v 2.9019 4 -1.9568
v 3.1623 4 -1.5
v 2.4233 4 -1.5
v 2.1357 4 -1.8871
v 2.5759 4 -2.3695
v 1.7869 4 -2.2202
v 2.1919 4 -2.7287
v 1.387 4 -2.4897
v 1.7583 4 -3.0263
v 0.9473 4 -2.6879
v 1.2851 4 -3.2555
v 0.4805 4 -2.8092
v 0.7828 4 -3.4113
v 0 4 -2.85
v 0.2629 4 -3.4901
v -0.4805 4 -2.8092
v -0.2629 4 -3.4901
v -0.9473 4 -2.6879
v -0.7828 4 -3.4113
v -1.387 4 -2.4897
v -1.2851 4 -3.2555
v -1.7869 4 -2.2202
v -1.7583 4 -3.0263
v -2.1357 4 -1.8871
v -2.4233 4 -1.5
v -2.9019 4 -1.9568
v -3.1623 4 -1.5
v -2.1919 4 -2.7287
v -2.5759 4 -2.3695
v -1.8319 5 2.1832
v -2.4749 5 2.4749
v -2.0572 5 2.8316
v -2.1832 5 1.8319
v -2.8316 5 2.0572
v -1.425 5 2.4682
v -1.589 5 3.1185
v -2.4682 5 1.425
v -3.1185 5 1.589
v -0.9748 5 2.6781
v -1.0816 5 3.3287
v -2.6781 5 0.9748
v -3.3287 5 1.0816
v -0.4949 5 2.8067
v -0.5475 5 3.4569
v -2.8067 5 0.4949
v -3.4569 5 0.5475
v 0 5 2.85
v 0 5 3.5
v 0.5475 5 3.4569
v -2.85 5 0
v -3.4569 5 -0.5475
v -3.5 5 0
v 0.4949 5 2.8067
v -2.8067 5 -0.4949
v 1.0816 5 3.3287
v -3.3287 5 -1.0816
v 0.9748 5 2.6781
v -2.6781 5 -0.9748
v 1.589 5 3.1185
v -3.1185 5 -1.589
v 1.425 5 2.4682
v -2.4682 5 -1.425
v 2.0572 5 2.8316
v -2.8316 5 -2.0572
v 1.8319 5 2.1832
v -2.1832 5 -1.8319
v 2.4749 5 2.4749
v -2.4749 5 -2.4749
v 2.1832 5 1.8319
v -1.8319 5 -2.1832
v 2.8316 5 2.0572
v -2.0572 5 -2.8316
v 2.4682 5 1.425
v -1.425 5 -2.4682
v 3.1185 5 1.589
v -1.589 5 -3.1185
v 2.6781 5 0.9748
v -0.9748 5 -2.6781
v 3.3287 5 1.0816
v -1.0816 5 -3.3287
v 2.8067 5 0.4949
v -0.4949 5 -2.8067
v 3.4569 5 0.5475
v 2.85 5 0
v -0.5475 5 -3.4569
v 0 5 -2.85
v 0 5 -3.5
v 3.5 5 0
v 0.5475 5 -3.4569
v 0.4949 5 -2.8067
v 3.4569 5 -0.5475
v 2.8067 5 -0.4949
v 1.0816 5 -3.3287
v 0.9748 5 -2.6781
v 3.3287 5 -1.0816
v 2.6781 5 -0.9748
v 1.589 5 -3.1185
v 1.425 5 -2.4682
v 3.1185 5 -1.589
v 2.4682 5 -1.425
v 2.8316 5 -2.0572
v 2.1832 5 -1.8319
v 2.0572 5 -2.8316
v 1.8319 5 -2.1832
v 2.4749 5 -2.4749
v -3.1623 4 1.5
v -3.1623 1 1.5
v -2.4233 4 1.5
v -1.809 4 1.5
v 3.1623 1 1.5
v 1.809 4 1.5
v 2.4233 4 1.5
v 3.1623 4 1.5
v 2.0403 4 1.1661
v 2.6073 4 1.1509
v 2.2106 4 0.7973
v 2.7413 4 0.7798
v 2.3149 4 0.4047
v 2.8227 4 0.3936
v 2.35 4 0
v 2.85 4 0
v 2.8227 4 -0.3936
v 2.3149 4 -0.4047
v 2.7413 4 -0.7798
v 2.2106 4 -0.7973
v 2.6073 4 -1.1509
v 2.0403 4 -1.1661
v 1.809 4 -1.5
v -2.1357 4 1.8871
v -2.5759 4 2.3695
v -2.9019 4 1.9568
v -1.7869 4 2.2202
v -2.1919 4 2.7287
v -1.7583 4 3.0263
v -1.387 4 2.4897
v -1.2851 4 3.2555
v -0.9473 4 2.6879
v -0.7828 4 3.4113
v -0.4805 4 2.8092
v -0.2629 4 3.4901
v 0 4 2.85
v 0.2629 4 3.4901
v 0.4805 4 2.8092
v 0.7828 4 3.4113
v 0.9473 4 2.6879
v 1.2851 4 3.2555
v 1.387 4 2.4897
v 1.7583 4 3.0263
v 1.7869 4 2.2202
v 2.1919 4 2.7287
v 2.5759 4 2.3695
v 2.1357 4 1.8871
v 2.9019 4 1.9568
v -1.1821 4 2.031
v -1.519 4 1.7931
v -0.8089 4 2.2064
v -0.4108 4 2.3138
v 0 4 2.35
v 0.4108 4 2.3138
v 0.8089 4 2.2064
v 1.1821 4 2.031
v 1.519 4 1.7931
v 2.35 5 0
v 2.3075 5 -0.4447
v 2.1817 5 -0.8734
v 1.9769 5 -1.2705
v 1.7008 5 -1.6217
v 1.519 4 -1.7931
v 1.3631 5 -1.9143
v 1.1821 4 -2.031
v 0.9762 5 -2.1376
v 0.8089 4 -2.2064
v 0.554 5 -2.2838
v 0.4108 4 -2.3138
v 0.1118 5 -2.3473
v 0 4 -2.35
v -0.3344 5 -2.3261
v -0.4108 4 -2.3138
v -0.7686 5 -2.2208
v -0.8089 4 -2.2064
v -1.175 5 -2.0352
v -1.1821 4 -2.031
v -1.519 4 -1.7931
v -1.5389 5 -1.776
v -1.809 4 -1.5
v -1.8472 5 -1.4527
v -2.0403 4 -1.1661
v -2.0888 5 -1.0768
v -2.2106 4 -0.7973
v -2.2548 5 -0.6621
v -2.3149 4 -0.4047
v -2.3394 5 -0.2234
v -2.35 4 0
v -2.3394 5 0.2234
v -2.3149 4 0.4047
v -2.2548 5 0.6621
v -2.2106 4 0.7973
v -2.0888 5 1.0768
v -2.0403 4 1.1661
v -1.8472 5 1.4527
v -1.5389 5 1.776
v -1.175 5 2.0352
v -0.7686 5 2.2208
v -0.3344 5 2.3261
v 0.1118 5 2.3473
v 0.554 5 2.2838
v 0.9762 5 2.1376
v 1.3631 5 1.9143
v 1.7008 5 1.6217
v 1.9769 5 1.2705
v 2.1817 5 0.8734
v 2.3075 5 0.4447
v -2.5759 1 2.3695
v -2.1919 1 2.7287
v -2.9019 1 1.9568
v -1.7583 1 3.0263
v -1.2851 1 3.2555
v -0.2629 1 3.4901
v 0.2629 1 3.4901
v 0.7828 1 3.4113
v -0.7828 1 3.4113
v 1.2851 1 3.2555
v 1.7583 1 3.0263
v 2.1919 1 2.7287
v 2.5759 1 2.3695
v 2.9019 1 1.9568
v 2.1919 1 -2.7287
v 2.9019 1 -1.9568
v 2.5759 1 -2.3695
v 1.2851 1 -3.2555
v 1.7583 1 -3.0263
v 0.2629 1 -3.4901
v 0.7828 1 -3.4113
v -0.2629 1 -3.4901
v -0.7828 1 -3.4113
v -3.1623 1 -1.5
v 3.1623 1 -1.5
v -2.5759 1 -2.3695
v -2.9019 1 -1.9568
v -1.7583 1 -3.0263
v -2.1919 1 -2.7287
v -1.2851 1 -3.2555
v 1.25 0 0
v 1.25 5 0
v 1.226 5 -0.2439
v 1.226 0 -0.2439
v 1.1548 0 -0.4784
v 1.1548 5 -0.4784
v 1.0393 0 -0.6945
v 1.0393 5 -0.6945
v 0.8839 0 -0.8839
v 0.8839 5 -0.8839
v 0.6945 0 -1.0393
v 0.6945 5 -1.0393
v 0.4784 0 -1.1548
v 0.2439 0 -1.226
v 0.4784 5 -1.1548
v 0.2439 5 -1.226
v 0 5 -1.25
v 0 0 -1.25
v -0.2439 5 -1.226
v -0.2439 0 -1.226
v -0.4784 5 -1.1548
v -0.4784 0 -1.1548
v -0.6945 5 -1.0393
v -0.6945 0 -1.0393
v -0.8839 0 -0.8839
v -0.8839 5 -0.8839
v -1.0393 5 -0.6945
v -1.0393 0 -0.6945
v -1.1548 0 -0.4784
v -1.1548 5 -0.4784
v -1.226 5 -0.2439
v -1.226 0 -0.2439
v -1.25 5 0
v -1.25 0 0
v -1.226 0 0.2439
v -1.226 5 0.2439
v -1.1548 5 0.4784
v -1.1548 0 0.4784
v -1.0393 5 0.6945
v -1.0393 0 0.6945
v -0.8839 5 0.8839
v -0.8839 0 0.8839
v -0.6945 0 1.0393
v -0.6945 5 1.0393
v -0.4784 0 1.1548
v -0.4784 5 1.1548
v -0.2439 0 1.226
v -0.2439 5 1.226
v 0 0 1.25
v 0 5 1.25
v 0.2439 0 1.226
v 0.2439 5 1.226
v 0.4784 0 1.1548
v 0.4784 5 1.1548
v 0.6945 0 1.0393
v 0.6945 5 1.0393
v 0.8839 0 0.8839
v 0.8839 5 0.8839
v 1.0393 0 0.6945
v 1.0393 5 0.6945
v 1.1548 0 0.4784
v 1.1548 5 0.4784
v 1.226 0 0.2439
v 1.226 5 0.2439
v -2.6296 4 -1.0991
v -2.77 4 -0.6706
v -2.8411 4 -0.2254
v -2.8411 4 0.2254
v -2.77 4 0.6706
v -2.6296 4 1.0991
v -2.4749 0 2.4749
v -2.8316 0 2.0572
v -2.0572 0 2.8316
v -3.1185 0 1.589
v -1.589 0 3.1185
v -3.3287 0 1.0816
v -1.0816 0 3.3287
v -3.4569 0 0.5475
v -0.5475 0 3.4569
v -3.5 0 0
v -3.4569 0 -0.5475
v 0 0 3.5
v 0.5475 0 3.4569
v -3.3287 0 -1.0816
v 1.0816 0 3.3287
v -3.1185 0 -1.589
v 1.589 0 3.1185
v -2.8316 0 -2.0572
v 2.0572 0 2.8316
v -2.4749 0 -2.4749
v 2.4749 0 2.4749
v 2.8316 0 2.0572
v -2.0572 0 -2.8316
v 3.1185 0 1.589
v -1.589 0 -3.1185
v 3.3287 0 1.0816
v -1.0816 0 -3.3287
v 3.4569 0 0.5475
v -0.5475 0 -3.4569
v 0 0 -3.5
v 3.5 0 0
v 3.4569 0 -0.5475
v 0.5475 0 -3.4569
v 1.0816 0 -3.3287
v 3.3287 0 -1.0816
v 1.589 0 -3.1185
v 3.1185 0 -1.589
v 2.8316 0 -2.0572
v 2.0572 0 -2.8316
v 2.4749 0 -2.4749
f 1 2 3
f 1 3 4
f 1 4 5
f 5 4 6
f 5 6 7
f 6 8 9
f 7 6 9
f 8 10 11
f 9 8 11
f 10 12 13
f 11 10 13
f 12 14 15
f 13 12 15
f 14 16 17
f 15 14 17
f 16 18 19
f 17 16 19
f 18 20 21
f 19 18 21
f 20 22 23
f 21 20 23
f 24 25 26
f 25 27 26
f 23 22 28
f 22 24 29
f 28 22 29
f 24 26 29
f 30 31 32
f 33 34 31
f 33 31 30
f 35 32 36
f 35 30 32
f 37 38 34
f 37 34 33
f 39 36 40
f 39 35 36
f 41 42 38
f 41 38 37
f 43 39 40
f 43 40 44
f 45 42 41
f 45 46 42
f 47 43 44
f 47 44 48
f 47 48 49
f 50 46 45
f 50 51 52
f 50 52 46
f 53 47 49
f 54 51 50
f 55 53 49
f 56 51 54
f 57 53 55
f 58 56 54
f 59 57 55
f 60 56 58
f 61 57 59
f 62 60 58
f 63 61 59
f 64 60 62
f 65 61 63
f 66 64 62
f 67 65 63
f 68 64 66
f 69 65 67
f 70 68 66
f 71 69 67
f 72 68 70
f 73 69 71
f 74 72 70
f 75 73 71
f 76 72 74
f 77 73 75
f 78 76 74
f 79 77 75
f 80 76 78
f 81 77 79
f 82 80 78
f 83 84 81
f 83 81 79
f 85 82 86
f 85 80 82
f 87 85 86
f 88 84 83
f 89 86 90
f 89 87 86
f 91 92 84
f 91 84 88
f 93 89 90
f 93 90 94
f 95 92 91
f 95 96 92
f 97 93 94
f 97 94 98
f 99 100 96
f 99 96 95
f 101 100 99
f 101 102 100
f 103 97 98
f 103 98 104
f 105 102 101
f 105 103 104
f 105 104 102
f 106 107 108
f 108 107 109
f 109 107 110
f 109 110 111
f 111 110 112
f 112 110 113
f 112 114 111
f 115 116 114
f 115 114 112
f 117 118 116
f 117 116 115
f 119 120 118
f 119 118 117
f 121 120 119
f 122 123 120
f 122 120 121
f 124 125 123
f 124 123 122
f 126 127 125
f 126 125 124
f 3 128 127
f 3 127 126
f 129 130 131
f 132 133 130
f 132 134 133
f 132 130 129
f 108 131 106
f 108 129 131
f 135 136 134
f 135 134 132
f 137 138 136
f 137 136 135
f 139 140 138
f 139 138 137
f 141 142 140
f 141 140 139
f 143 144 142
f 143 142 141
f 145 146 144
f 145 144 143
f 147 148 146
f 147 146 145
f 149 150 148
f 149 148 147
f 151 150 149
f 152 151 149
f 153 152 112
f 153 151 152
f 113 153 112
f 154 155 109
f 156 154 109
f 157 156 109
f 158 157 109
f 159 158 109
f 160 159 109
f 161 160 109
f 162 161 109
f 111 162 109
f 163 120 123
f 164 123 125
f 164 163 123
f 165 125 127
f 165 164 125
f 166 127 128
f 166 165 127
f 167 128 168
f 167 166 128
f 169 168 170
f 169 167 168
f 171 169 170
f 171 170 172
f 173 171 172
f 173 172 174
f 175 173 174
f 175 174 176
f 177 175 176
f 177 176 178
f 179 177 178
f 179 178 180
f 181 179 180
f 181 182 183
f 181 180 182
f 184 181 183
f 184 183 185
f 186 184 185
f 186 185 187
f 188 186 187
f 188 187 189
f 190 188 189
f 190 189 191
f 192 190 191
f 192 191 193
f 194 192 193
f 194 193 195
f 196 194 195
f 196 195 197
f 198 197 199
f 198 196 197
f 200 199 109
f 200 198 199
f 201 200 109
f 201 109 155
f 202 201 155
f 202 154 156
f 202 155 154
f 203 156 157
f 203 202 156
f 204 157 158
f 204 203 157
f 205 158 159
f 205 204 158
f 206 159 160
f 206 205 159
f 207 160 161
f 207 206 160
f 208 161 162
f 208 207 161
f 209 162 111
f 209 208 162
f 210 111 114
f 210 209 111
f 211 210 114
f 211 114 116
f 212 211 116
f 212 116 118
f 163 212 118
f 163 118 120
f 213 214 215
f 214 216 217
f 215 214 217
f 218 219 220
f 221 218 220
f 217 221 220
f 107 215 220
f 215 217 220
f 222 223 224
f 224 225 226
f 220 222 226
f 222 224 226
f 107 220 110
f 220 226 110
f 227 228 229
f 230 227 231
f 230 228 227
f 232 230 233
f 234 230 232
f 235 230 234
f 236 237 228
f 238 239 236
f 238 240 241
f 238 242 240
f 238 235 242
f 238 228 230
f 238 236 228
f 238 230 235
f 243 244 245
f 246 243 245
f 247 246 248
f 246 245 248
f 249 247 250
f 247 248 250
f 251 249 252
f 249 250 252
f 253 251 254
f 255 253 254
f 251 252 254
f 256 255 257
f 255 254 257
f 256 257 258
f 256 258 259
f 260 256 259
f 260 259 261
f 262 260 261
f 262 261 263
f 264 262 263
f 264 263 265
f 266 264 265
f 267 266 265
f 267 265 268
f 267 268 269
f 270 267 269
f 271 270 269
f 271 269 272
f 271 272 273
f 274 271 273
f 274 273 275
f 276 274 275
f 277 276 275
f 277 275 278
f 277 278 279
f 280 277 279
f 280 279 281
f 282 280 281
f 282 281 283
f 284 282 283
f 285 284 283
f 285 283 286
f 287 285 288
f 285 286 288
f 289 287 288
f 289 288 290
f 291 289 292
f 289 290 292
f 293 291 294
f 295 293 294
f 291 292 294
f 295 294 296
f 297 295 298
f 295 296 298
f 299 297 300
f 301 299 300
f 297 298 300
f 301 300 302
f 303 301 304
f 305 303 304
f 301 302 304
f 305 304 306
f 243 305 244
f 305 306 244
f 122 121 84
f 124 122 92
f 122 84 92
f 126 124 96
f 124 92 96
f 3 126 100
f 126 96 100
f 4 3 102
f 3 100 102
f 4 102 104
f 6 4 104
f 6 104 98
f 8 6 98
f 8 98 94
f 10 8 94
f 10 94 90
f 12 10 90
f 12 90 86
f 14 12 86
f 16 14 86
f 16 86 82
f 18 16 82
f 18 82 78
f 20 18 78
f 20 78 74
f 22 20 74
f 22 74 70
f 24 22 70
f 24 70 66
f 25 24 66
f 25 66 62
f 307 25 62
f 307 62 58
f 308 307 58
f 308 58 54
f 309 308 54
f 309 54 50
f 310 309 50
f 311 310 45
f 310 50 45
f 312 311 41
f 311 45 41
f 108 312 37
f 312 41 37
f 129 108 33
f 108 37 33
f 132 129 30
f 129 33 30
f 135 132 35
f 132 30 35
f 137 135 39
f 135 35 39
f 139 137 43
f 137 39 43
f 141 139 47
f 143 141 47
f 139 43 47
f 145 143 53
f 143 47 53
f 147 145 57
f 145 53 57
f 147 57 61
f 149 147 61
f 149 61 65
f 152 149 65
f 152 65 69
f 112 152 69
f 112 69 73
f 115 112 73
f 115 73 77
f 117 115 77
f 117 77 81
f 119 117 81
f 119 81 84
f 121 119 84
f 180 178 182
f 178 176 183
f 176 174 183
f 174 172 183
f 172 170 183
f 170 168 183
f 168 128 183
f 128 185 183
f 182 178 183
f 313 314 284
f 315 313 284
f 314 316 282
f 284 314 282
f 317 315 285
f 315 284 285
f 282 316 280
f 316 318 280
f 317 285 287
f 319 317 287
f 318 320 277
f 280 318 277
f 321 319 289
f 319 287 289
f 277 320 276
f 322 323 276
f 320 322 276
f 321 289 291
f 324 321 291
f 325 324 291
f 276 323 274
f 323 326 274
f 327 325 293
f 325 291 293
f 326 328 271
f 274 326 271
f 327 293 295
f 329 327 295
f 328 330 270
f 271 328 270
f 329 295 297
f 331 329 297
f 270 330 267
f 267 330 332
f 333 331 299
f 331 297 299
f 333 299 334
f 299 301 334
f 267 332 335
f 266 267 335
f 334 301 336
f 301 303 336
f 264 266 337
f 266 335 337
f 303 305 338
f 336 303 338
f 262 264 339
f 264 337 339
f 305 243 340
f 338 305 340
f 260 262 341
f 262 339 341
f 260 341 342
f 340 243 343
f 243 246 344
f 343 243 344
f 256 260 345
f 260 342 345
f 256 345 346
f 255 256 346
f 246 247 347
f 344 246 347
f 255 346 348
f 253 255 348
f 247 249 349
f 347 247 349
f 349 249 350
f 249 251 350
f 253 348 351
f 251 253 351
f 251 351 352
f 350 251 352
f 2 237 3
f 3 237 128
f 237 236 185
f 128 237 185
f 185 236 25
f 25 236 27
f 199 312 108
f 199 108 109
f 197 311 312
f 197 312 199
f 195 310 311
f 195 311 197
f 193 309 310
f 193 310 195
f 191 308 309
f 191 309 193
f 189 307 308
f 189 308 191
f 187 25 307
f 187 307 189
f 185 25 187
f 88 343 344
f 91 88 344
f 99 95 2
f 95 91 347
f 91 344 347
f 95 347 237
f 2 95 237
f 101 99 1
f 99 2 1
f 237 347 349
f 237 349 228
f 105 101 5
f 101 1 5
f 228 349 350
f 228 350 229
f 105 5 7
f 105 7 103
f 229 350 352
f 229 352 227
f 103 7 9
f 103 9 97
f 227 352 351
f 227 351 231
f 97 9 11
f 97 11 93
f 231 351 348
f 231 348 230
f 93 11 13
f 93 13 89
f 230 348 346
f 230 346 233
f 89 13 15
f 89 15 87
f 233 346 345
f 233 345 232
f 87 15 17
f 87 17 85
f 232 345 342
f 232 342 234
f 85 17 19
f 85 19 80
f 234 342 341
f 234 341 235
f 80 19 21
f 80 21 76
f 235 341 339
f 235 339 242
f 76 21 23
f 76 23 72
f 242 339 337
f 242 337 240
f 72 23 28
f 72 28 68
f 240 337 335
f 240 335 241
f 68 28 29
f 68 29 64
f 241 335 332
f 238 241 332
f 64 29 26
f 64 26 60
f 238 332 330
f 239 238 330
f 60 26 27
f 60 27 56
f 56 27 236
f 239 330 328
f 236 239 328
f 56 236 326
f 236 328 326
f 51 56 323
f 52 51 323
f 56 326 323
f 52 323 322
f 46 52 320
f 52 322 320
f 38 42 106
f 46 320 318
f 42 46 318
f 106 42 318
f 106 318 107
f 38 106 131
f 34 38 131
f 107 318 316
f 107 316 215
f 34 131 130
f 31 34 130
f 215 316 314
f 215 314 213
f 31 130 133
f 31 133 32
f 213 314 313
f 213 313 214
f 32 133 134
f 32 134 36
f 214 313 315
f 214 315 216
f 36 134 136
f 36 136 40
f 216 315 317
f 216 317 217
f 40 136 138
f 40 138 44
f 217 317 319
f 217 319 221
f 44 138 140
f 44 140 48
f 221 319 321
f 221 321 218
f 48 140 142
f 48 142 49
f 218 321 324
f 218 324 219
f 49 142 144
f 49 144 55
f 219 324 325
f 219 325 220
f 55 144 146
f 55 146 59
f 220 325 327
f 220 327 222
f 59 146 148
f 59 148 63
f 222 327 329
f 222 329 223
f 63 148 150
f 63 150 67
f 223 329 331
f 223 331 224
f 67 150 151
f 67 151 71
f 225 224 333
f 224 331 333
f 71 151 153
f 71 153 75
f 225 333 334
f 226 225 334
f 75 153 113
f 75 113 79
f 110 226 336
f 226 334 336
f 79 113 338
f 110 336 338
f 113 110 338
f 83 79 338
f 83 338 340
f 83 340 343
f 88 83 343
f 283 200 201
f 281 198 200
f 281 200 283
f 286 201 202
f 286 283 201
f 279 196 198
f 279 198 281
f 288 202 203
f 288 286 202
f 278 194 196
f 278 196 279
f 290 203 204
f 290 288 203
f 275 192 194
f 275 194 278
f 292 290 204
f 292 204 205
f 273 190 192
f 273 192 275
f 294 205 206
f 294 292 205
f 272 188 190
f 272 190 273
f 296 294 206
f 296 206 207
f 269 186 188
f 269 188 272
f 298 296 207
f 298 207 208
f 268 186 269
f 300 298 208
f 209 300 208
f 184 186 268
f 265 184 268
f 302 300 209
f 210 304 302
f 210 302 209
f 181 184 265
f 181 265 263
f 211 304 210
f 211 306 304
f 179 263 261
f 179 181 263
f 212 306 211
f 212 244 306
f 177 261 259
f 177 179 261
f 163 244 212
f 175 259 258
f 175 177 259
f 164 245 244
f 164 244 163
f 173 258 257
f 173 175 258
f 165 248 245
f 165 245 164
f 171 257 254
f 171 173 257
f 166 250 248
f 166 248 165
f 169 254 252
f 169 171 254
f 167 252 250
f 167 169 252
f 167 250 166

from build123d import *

# Parameters (mm, degrees)
ESQUISSE1_R                  = 3.5
BOSS_EXTRU_1_DEPTH           = 5
ESQUISSE2_R                  = 2.85
ESQUISSE2_R_2                = 2.35
ENL_V_MAT_EXTRU_1_DEPTH      = 1
ESQUISSE3_R                  = 1.25
ENL_V_MAT_EXTRU_2_DEPTH      = 6
ESQUISSE4_W                  = 2
ESQUISSE4_H                  = 3
ENL_V_MAT_EXTRU_3_DEPTH      = 4.5
ENL_V_MAT_EXTRU_3_DEPTH_BACK = 4.5


with BuildPart() as part:
    # Esquisse1 → Boss.-Extru.1 (new body)
    with BuildSketch(Plane(origin=(0, 0, 0), x_dir=(1, 0, 0), z_dir=(0, 1, 0))):
        Circle(ESQUISSE1_R)
    extrude(amount=BOSS_EXTRU_1_DEPTH)

    # Esquisse2 → Enlèv. mat.-Extru.1 (cut)
    with BuildSketch(Plane(origin=(0, 5, 0), x_dir=(1, 0, 0), z_dir=(0, 1, 0))):
        Circle(ESQUISSE2_R)
        Circle(ESQUISSE2_R_2, mode=Mode.SUBTRACT)
    extrude(amount=-ENL_V_MAT_EXTRU_1_DEPTH, mode=Mode.SUBTRACT)

    # Esquisse3 → Enlèv. mat.-Extru.2 (cut, through all)
    with BuildSketch(Plane(origin=(0, 5, 0), x_dir=(1, 0, 0), z_dir=(0, 1, 0))):
        Circle(ESQUISSE3_R)
    extrude(amount=-ENL_V_MAT_EXTRU_2_DEPTH, mode=Mode.SUBTRACT)

    # Esquisse4 → Enlèv. mat.-Extru.3 (cut, two sides)
    with BuildSketch(Plane(origin=(0, 0, 0), x_dir=(0, 0, -1), z_dir=(1, 0, 0))) as enl_v_mat_extru_3_sk:
        with Locations((-2.5, 2.5)):
            Rectangle(ESQUISSE4_W, ESQUISSE4_H)
        with Locations((2.5, 2.5)):
            Rectangle(ESQUISSE4_W, ESQUISSE4_H)
    extrude(amount=ENL_V_MAT_EXTRU_3_DEPTH, mode=Mode.SUBTRACT)
    extrude(enl_v_mat_extru_3_sk.sketch, amount=-ENL_V_MAT_EXTRU_3_DEPTH_BACK, mode=Mode.SUBTRACT)


solid = part.part
